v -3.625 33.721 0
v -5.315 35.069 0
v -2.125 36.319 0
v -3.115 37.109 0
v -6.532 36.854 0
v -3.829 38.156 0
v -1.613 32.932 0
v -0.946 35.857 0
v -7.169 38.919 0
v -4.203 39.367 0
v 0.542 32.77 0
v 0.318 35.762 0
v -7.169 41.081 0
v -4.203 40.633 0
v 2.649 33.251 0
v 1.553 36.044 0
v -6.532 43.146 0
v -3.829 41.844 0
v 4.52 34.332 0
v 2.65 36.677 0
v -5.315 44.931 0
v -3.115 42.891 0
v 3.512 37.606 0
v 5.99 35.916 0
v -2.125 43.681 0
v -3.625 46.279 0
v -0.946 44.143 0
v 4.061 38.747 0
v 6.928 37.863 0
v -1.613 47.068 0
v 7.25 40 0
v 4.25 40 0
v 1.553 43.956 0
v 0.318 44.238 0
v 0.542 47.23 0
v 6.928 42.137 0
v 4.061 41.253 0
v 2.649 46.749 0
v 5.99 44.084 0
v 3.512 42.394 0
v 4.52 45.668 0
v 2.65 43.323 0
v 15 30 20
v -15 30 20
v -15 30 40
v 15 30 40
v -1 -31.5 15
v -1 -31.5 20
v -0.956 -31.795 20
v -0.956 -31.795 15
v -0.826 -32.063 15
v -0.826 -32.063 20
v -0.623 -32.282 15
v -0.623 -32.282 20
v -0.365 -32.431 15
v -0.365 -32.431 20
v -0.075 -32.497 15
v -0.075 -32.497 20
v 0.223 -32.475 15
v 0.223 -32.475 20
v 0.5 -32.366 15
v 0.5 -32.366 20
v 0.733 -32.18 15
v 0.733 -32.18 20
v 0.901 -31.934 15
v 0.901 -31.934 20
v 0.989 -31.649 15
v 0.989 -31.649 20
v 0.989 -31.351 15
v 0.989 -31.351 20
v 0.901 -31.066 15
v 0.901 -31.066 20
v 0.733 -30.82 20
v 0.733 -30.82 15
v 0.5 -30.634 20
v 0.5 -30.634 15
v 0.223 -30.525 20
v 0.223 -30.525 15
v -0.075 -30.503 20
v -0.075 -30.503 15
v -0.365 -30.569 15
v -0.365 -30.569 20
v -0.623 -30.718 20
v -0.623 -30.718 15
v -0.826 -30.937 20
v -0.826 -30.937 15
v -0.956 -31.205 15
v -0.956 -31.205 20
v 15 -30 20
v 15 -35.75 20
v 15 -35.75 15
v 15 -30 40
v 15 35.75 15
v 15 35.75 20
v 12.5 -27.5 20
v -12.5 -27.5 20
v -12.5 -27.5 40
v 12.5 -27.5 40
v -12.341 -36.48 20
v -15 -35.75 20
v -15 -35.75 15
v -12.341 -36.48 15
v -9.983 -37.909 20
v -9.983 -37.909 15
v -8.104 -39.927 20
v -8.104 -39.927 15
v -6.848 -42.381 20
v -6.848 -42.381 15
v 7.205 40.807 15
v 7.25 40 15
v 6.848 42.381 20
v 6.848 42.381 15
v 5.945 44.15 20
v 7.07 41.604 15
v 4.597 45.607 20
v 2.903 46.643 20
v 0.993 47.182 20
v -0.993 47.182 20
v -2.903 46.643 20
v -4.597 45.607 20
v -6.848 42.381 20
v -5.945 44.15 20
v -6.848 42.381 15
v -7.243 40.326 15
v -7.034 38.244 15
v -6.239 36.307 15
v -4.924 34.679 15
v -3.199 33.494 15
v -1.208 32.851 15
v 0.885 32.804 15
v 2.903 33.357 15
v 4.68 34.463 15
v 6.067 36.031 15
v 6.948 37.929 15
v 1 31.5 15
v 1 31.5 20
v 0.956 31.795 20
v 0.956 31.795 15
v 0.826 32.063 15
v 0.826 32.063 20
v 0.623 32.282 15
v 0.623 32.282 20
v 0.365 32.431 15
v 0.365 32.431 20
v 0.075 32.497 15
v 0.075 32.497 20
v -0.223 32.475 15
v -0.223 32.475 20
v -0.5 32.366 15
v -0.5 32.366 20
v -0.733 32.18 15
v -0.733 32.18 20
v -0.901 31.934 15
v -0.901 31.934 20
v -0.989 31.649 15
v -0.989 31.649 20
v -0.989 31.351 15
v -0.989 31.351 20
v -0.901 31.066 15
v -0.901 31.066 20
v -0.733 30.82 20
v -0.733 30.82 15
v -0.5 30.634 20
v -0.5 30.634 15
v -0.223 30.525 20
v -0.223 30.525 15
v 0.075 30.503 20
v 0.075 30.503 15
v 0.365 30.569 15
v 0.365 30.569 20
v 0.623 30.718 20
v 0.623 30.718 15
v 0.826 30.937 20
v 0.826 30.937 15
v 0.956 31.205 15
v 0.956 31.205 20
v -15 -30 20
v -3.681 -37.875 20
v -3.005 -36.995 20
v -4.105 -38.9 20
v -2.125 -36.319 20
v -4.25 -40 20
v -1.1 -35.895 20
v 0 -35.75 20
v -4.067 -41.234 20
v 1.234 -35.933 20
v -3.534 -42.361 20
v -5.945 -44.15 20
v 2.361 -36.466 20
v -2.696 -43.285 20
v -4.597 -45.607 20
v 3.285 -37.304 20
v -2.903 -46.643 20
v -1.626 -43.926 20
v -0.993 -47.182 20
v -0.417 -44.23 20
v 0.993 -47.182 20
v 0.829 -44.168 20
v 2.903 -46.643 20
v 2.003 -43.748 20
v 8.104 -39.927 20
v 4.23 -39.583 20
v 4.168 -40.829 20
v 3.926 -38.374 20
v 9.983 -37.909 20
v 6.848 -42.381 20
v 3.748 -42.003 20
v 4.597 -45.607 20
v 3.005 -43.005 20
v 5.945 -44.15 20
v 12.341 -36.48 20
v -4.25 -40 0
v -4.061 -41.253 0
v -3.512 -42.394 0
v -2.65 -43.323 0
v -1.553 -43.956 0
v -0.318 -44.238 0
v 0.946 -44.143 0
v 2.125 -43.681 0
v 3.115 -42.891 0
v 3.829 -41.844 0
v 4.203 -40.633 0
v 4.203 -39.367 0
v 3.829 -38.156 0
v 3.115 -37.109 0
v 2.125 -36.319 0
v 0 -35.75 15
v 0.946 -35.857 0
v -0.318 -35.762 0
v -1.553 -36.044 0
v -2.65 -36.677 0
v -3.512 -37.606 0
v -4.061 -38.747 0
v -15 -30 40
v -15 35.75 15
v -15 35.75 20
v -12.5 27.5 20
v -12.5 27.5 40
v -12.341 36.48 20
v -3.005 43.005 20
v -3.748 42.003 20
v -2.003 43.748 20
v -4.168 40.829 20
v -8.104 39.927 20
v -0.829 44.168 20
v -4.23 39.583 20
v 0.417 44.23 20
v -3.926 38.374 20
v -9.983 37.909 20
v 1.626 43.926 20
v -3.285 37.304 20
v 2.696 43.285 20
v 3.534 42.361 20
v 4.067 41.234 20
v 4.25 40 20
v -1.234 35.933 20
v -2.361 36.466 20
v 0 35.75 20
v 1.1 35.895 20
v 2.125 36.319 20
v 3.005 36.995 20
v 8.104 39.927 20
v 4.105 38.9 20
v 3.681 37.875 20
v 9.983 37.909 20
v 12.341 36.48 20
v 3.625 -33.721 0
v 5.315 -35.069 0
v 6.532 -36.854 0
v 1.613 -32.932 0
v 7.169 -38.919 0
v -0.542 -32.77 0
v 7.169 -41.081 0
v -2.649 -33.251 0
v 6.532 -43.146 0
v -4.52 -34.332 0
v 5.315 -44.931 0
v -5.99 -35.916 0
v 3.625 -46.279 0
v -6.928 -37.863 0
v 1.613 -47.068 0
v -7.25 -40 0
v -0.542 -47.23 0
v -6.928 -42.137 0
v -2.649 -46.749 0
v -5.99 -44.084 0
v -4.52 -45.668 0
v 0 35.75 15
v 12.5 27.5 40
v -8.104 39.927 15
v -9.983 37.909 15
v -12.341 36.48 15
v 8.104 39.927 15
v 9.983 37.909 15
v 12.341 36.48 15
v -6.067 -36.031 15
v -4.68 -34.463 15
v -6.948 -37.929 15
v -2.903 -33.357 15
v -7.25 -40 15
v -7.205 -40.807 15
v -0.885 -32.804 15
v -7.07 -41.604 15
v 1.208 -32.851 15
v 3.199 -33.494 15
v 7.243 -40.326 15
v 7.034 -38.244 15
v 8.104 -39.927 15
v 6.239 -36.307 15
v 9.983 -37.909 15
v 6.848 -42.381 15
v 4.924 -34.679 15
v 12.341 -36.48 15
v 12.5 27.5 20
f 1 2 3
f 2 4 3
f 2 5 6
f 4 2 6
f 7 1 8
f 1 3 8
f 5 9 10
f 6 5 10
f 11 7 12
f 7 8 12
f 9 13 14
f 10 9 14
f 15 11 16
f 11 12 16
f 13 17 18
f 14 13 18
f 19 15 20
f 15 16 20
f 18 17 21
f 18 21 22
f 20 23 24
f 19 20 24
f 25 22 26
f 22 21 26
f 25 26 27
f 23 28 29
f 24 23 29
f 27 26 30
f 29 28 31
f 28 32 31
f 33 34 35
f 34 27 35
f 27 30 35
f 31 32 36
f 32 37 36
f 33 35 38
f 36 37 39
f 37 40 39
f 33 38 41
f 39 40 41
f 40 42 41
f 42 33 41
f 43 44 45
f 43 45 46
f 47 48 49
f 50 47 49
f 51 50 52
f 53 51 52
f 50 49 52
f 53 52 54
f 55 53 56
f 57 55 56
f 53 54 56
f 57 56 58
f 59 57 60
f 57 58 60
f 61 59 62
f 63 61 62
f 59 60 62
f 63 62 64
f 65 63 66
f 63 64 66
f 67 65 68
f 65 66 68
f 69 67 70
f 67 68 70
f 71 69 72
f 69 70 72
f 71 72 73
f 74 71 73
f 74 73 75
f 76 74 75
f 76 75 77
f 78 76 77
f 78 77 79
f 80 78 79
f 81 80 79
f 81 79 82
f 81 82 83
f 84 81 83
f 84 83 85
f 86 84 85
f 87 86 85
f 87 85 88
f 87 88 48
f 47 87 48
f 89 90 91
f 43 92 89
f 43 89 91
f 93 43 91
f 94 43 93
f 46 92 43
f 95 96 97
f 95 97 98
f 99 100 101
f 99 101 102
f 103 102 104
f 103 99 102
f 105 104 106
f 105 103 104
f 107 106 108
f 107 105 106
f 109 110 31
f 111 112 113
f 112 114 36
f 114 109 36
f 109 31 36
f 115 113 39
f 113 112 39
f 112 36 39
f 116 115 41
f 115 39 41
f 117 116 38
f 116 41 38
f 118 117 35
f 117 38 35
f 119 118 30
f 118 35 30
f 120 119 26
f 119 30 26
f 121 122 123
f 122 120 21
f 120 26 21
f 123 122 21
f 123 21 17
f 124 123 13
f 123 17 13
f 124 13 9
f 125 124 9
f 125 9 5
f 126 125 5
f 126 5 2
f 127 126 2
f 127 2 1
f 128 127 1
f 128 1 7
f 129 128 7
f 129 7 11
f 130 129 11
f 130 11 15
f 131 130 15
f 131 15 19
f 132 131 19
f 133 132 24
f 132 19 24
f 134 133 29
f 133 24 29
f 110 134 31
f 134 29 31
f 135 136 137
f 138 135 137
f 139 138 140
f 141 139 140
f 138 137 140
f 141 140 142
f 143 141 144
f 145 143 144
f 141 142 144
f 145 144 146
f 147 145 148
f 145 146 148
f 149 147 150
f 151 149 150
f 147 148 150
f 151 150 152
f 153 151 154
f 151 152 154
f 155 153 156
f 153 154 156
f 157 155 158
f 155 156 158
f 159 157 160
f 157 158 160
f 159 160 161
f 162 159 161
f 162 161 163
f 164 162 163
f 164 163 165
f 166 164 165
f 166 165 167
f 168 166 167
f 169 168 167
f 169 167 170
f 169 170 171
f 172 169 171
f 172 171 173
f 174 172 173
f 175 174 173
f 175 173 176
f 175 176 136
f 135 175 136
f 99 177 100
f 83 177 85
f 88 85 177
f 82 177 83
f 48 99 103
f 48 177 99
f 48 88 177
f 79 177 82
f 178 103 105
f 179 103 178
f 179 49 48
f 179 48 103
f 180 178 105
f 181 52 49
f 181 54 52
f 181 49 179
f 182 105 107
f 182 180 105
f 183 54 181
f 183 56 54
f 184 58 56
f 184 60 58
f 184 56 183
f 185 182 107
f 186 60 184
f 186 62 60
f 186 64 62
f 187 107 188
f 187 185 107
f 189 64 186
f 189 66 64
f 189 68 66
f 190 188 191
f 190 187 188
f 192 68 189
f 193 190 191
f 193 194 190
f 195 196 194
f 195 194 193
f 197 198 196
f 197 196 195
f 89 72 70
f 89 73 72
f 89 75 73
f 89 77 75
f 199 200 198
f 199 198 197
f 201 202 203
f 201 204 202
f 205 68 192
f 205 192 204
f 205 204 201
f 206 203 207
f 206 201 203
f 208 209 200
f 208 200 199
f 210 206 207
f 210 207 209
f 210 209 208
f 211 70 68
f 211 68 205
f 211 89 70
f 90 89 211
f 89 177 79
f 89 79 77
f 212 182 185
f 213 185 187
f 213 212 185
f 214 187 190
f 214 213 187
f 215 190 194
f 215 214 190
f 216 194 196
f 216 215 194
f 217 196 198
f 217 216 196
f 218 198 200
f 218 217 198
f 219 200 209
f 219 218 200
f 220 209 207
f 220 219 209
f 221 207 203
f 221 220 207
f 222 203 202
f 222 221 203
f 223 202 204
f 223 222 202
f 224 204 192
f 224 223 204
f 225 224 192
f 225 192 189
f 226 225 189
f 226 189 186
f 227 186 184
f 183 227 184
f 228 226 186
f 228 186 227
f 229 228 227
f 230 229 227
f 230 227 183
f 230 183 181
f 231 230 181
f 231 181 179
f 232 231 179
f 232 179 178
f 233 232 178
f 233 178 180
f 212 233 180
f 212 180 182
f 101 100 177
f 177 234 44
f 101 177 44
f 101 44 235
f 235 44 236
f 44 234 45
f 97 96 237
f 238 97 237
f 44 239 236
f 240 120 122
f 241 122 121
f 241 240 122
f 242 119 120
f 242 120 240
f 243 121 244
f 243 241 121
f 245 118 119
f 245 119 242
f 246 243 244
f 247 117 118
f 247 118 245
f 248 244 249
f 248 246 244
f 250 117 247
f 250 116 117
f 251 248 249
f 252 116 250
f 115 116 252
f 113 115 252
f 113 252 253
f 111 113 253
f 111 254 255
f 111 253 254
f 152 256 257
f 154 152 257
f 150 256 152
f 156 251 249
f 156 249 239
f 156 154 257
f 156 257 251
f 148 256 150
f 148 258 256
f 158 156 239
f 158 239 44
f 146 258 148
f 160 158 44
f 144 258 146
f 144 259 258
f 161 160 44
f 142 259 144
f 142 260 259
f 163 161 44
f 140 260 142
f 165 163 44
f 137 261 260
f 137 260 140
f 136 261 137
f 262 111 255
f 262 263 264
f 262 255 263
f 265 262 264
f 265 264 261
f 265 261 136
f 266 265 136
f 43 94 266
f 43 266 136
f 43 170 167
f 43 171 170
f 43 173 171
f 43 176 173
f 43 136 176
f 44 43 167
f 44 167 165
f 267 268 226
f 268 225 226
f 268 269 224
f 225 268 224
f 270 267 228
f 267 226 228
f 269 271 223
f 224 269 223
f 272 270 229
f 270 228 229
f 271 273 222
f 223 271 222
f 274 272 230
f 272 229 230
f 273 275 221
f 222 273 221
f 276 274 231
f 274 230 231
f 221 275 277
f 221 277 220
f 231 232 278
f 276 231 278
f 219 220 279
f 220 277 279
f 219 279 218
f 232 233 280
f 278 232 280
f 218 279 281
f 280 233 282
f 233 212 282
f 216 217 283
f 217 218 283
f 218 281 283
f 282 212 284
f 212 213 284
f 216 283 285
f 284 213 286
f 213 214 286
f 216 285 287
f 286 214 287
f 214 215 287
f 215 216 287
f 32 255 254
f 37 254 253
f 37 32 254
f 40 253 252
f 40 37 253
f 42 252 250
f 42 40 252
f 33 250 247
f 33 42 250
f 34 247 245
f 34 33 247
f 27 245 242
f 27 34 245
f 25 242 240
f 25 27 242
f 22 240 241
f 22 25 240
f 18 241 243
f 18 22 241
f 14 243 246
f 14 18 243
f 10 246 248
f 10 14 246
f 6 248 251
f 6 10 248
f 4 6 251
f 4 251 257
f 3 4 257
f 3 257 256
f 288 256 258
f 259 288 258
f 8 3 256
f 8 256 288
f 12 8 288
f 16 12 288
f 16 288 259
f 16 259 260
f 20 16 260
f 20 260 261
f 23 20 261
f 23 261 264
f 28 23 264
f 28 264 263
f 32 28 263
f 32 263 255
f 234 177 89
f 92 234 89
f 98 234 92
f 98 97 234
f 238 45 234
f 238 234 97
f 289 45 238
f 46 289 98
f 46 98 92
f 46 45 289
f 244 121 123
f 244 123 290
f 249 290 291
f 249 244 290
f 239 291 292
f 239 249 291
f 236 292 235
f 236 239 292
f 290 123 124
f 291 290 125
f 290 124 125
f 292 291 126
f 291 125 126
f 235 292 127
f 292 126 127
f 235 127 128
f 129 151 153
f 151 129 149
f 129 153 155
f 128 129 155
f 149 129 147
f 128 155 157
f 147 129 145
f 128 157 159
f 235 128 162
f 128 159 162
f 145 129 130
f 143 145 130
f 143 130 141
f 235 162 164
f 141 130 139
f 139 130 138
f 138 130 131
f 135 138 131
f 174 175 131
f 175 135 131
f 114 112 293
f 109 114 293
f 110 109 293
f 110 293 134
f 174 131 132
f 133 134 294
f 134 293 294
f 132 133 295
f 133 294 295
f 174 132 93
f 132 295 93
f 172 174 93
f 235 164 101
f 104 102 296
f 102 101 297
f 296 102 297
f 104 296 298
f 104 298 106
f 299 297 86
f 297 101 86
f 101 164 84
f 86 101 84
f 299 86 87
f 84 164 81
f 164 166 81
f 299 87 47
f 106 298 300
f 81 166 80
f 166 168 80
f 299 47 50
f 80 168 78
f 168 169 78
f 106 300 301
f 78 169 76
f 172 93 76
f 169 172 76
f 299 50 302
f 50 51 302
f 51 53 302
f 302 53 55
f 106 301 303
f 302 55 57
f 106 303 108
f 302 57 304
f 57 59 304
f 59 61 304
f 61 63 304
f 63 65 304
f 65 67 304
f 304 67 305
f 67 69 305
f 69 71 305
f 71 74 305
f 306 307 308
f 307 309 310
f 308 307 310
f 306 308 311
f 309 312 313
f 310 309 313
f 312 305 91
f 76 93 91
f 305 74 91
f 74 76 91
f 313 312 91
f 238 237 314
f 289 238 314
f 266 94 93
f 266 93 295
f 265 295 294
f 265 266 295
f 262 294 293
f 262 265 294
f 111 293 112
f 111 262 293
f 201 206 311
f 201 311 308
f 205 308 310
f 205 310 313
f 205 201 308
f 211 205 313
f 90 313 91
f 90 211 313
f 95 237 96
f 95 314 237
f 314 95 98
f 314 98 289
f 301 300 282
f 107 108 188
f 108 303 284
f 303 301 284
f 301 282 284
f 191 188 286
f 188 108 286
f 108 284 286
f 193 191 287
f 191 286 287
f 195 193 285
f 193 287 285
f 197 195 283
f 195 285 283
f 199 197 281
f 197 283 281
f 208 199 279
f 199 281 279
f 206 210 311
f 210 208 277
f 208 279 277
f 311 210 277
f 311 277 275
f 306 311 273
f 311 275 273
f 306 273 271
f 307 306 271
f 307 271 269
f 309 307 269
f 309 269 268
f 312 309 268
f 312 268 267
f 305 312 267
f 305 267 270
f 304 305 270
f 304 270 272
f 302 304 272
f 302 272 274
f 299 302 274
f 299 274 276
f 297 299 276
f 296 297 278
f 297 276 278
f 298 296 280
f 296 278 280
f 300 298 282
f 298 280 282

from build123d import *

# Parameters (mm, degrees)
ESBO_O1_R                  = 7.25
ESBO_O1_R_2                = 4.25
RESSALTO_EXTRUS_O1_DEPTH   = 20
RESSALTO_EXTRUS_O1_2_DEPTH = 20
ESBO_O2_W                  = 30
ESBO_O2_H                  = 71.5
RESSALTO_EXTRUS_O2_DEPTH   = 5
FILETE1_R                  = 10
ESBO_O3_W                  = 30
ESBO_O3_H                  = 60
ESBO_O3_W_2                = 25
ESBO_O3_H_2                = 55
RESSALTO_EXTRUS_O3_DEPTH   = 20
ESBO_O4_R                  = 1
CORTE_EXTRUS_O1_DEPTH      = 54.456173638


with BuildPart() as part:
    # Esboço1 → Ressalto-extrusão1 (new body)
    with BuildSketch(Plane.XY):
        with Locations((0, 40)):
            Circle(ESBO_O1_R)
        with Locations((0, 40)):
            Circle(ESBO_O1_R_2, mode=Mode.SUBTRACT)
    extrude(amount=RESSALTO_EXTRUS_O1_DEPTH)



with BuildPart() as body_2:
    # Esboço1 → Ressalto-extrus_o1 2 (new body)
    with BuildSketch(Plane.XY):
        with Locations(Location((0, -40, 0), (0, 0, 180))):
            Circle(ESBO_O1_R)
        with Locations(Location((0, -40, 0), (0, 0, 180))):
            Circle(ESBO_O1_R_2, mode=Mode.SUBTRACT)
    extrude(amount=RESSALTO_EXTRUS_O1_2_DEPTH)


with BuildPart() as part_1:
    add(part.part)

    add(body_2.part)  # Ressalto-extrusão2 merges body 2
    # Esboço2 → Ressalto-extrusão2 (add)
    with BuildSketch(Plane.XY.offset(20)):
        Rectangle(ESBO_O2_W, ESBO_O2_H)
    extrude(amount=-RESSALTO_EXTRUS_O2_DEPTH)

    # Filete1
    # the kernel refuses this fillet: 10 mm, written as the material it adds along each edge
    with BuildSketch(Plane(origin=(-5.873670062, -35.75, 20), x_dir=(-1, 0, 0), z_dir=(0, 0, -1))) as filete1_piece_1:
        with BuildLine():
            CenterArc((10.419216441, -9.916070012), FILETE1_R, 97.428488086, 63.395706738)
            Line((0.974064845, -6.631391744), (0.785161813, -6.565698179))
            ThreePointArc((0.785161813, -6.565698179), (1.101484321, -3.225440913), (-0.162032278, -0.117241379))
            Line((-0.162032278, -0.117241379), (0, 0.2))
            ThreePointArc((0, 0.2), (4.563164969, 0.2), (9.100472208, 0.1983214))
            Line((9.100472208, 0.1983214), (9.126329938, 0))
        make_face()
    extrude(amount=5)
    with BuildSketch(Plane(origin=(5.873670062, -35.75, 20), x_dir=(1, 0, 0), z_dir=(0, 0, -1))) as filete1_piece_2:
        with BuildLine():
            CenterArc((10.419216441, 9.916070012), FILETE1_R, 199.175805176, 63.395706738)
            Line((0.974064845, 6.631391744), (0.785161813, 6.565698179))
            ThreePointArc((0.785161813, 6.565698179), (1.101484321, 3.225440913), (-0.162032278, 0.117241379))
            Line((-0.162032278, 0.117241379), (0, -0.2))
            ThreePointArc((0, -0.2), (4.563164969, -0.2), (9.100472208, -0.1983214))
            Line((9.100472208, -0.1983214), (9.126329938, 0))
        make_face()
    extrude(amount=5)
    with BuildSketch(Plane(origin=(5.873670062, 35.75, 20), x_dir=(0.14532753012910826, 0.9893836005243736, 0), z_dir=(0, 0, -1))) as filete1_piece_3:
        with BuildLine():
            CenterArc((11.324996043, 8.867523914), FILETE1_R, 179.072241898, 63.395706738)
            Line((1.326306989, 9.029441173), (1.126333208, 9.032679519))
            ThreePointArc((1.126333208, 9.032679519), (0.465276774, 4.543786093), (-0.19787672, 0.029065506))
            Line((-0.19787672, 0.029065506), (0.092448947, -0.177350478))
            ThreePointArc((0.092448947, -0.177350478), (3.351274339, 0.621045162), (6.610099731, -0.177350478))
            Line((6.610099731, -0.177350478), (6.702548679, 0))
        make_face()
    extrude(amount=5)
    with BuildSketch(Plane(origin=(-5.873670062, 35.75, 20), x_dir=(-0.14532753012910826, 0.9893836005243736, 0), z_dir=(0, 0, -1))) as filete1_piece_4:
        with BuildLine():
            CenterArc((11.324996043, -8.867523914), FILETE1_R, 117.532051364, 63.395706738)
            Line((1.326306989, -9.029441173), (1.126333208, -9.032679519))
            ThreePointArc((1.126333208, -9.032679519), (0.465276774, -4.543786093), (-0.19787672, -0.029065506))
            Line((-0.19787672, -0.029065506), (0.092448947, 0.177350478))
            ThreePointArc((0.092448947, 0.177350478), (3.351274339, -0.621045162), (6.610099731, 0.177350478))
            Line((6.610099731, 0.177350478), (6.702548679, 0))
        make_face()
    extrude(amount=5)

    # Esboço3 → Ressalto-extrusão3 (add)
    with BuildSketch(Plane.XY.offset(20)):
        Rectangle(ESBO_O3_W, ESBO_O3_H)
        Rectangle(ESBO_O3_W_2, ESBO_O3_H_2, mode=Mode.SUBTRACT)
    extrude(amount=RESSALTO_EXTRUS_O3_DEPTH)

    # Esboço4 → Corte-extrusão1 (cut, through all)
    with BuildSketch(Plane.XY.offset(20)):
        with Locations((0, 31.5)):
            Circle(ESBO_O4_R)
        with Locations(Location((0, -31.5, 0), (0, 0, 180))):
            Circle(ESBO_O4_R)
    extrude(amount=-CORTE_EXTRUS_O1_DEPTH, mode=Mode.SUBTRACT)


solid = part_1.part
